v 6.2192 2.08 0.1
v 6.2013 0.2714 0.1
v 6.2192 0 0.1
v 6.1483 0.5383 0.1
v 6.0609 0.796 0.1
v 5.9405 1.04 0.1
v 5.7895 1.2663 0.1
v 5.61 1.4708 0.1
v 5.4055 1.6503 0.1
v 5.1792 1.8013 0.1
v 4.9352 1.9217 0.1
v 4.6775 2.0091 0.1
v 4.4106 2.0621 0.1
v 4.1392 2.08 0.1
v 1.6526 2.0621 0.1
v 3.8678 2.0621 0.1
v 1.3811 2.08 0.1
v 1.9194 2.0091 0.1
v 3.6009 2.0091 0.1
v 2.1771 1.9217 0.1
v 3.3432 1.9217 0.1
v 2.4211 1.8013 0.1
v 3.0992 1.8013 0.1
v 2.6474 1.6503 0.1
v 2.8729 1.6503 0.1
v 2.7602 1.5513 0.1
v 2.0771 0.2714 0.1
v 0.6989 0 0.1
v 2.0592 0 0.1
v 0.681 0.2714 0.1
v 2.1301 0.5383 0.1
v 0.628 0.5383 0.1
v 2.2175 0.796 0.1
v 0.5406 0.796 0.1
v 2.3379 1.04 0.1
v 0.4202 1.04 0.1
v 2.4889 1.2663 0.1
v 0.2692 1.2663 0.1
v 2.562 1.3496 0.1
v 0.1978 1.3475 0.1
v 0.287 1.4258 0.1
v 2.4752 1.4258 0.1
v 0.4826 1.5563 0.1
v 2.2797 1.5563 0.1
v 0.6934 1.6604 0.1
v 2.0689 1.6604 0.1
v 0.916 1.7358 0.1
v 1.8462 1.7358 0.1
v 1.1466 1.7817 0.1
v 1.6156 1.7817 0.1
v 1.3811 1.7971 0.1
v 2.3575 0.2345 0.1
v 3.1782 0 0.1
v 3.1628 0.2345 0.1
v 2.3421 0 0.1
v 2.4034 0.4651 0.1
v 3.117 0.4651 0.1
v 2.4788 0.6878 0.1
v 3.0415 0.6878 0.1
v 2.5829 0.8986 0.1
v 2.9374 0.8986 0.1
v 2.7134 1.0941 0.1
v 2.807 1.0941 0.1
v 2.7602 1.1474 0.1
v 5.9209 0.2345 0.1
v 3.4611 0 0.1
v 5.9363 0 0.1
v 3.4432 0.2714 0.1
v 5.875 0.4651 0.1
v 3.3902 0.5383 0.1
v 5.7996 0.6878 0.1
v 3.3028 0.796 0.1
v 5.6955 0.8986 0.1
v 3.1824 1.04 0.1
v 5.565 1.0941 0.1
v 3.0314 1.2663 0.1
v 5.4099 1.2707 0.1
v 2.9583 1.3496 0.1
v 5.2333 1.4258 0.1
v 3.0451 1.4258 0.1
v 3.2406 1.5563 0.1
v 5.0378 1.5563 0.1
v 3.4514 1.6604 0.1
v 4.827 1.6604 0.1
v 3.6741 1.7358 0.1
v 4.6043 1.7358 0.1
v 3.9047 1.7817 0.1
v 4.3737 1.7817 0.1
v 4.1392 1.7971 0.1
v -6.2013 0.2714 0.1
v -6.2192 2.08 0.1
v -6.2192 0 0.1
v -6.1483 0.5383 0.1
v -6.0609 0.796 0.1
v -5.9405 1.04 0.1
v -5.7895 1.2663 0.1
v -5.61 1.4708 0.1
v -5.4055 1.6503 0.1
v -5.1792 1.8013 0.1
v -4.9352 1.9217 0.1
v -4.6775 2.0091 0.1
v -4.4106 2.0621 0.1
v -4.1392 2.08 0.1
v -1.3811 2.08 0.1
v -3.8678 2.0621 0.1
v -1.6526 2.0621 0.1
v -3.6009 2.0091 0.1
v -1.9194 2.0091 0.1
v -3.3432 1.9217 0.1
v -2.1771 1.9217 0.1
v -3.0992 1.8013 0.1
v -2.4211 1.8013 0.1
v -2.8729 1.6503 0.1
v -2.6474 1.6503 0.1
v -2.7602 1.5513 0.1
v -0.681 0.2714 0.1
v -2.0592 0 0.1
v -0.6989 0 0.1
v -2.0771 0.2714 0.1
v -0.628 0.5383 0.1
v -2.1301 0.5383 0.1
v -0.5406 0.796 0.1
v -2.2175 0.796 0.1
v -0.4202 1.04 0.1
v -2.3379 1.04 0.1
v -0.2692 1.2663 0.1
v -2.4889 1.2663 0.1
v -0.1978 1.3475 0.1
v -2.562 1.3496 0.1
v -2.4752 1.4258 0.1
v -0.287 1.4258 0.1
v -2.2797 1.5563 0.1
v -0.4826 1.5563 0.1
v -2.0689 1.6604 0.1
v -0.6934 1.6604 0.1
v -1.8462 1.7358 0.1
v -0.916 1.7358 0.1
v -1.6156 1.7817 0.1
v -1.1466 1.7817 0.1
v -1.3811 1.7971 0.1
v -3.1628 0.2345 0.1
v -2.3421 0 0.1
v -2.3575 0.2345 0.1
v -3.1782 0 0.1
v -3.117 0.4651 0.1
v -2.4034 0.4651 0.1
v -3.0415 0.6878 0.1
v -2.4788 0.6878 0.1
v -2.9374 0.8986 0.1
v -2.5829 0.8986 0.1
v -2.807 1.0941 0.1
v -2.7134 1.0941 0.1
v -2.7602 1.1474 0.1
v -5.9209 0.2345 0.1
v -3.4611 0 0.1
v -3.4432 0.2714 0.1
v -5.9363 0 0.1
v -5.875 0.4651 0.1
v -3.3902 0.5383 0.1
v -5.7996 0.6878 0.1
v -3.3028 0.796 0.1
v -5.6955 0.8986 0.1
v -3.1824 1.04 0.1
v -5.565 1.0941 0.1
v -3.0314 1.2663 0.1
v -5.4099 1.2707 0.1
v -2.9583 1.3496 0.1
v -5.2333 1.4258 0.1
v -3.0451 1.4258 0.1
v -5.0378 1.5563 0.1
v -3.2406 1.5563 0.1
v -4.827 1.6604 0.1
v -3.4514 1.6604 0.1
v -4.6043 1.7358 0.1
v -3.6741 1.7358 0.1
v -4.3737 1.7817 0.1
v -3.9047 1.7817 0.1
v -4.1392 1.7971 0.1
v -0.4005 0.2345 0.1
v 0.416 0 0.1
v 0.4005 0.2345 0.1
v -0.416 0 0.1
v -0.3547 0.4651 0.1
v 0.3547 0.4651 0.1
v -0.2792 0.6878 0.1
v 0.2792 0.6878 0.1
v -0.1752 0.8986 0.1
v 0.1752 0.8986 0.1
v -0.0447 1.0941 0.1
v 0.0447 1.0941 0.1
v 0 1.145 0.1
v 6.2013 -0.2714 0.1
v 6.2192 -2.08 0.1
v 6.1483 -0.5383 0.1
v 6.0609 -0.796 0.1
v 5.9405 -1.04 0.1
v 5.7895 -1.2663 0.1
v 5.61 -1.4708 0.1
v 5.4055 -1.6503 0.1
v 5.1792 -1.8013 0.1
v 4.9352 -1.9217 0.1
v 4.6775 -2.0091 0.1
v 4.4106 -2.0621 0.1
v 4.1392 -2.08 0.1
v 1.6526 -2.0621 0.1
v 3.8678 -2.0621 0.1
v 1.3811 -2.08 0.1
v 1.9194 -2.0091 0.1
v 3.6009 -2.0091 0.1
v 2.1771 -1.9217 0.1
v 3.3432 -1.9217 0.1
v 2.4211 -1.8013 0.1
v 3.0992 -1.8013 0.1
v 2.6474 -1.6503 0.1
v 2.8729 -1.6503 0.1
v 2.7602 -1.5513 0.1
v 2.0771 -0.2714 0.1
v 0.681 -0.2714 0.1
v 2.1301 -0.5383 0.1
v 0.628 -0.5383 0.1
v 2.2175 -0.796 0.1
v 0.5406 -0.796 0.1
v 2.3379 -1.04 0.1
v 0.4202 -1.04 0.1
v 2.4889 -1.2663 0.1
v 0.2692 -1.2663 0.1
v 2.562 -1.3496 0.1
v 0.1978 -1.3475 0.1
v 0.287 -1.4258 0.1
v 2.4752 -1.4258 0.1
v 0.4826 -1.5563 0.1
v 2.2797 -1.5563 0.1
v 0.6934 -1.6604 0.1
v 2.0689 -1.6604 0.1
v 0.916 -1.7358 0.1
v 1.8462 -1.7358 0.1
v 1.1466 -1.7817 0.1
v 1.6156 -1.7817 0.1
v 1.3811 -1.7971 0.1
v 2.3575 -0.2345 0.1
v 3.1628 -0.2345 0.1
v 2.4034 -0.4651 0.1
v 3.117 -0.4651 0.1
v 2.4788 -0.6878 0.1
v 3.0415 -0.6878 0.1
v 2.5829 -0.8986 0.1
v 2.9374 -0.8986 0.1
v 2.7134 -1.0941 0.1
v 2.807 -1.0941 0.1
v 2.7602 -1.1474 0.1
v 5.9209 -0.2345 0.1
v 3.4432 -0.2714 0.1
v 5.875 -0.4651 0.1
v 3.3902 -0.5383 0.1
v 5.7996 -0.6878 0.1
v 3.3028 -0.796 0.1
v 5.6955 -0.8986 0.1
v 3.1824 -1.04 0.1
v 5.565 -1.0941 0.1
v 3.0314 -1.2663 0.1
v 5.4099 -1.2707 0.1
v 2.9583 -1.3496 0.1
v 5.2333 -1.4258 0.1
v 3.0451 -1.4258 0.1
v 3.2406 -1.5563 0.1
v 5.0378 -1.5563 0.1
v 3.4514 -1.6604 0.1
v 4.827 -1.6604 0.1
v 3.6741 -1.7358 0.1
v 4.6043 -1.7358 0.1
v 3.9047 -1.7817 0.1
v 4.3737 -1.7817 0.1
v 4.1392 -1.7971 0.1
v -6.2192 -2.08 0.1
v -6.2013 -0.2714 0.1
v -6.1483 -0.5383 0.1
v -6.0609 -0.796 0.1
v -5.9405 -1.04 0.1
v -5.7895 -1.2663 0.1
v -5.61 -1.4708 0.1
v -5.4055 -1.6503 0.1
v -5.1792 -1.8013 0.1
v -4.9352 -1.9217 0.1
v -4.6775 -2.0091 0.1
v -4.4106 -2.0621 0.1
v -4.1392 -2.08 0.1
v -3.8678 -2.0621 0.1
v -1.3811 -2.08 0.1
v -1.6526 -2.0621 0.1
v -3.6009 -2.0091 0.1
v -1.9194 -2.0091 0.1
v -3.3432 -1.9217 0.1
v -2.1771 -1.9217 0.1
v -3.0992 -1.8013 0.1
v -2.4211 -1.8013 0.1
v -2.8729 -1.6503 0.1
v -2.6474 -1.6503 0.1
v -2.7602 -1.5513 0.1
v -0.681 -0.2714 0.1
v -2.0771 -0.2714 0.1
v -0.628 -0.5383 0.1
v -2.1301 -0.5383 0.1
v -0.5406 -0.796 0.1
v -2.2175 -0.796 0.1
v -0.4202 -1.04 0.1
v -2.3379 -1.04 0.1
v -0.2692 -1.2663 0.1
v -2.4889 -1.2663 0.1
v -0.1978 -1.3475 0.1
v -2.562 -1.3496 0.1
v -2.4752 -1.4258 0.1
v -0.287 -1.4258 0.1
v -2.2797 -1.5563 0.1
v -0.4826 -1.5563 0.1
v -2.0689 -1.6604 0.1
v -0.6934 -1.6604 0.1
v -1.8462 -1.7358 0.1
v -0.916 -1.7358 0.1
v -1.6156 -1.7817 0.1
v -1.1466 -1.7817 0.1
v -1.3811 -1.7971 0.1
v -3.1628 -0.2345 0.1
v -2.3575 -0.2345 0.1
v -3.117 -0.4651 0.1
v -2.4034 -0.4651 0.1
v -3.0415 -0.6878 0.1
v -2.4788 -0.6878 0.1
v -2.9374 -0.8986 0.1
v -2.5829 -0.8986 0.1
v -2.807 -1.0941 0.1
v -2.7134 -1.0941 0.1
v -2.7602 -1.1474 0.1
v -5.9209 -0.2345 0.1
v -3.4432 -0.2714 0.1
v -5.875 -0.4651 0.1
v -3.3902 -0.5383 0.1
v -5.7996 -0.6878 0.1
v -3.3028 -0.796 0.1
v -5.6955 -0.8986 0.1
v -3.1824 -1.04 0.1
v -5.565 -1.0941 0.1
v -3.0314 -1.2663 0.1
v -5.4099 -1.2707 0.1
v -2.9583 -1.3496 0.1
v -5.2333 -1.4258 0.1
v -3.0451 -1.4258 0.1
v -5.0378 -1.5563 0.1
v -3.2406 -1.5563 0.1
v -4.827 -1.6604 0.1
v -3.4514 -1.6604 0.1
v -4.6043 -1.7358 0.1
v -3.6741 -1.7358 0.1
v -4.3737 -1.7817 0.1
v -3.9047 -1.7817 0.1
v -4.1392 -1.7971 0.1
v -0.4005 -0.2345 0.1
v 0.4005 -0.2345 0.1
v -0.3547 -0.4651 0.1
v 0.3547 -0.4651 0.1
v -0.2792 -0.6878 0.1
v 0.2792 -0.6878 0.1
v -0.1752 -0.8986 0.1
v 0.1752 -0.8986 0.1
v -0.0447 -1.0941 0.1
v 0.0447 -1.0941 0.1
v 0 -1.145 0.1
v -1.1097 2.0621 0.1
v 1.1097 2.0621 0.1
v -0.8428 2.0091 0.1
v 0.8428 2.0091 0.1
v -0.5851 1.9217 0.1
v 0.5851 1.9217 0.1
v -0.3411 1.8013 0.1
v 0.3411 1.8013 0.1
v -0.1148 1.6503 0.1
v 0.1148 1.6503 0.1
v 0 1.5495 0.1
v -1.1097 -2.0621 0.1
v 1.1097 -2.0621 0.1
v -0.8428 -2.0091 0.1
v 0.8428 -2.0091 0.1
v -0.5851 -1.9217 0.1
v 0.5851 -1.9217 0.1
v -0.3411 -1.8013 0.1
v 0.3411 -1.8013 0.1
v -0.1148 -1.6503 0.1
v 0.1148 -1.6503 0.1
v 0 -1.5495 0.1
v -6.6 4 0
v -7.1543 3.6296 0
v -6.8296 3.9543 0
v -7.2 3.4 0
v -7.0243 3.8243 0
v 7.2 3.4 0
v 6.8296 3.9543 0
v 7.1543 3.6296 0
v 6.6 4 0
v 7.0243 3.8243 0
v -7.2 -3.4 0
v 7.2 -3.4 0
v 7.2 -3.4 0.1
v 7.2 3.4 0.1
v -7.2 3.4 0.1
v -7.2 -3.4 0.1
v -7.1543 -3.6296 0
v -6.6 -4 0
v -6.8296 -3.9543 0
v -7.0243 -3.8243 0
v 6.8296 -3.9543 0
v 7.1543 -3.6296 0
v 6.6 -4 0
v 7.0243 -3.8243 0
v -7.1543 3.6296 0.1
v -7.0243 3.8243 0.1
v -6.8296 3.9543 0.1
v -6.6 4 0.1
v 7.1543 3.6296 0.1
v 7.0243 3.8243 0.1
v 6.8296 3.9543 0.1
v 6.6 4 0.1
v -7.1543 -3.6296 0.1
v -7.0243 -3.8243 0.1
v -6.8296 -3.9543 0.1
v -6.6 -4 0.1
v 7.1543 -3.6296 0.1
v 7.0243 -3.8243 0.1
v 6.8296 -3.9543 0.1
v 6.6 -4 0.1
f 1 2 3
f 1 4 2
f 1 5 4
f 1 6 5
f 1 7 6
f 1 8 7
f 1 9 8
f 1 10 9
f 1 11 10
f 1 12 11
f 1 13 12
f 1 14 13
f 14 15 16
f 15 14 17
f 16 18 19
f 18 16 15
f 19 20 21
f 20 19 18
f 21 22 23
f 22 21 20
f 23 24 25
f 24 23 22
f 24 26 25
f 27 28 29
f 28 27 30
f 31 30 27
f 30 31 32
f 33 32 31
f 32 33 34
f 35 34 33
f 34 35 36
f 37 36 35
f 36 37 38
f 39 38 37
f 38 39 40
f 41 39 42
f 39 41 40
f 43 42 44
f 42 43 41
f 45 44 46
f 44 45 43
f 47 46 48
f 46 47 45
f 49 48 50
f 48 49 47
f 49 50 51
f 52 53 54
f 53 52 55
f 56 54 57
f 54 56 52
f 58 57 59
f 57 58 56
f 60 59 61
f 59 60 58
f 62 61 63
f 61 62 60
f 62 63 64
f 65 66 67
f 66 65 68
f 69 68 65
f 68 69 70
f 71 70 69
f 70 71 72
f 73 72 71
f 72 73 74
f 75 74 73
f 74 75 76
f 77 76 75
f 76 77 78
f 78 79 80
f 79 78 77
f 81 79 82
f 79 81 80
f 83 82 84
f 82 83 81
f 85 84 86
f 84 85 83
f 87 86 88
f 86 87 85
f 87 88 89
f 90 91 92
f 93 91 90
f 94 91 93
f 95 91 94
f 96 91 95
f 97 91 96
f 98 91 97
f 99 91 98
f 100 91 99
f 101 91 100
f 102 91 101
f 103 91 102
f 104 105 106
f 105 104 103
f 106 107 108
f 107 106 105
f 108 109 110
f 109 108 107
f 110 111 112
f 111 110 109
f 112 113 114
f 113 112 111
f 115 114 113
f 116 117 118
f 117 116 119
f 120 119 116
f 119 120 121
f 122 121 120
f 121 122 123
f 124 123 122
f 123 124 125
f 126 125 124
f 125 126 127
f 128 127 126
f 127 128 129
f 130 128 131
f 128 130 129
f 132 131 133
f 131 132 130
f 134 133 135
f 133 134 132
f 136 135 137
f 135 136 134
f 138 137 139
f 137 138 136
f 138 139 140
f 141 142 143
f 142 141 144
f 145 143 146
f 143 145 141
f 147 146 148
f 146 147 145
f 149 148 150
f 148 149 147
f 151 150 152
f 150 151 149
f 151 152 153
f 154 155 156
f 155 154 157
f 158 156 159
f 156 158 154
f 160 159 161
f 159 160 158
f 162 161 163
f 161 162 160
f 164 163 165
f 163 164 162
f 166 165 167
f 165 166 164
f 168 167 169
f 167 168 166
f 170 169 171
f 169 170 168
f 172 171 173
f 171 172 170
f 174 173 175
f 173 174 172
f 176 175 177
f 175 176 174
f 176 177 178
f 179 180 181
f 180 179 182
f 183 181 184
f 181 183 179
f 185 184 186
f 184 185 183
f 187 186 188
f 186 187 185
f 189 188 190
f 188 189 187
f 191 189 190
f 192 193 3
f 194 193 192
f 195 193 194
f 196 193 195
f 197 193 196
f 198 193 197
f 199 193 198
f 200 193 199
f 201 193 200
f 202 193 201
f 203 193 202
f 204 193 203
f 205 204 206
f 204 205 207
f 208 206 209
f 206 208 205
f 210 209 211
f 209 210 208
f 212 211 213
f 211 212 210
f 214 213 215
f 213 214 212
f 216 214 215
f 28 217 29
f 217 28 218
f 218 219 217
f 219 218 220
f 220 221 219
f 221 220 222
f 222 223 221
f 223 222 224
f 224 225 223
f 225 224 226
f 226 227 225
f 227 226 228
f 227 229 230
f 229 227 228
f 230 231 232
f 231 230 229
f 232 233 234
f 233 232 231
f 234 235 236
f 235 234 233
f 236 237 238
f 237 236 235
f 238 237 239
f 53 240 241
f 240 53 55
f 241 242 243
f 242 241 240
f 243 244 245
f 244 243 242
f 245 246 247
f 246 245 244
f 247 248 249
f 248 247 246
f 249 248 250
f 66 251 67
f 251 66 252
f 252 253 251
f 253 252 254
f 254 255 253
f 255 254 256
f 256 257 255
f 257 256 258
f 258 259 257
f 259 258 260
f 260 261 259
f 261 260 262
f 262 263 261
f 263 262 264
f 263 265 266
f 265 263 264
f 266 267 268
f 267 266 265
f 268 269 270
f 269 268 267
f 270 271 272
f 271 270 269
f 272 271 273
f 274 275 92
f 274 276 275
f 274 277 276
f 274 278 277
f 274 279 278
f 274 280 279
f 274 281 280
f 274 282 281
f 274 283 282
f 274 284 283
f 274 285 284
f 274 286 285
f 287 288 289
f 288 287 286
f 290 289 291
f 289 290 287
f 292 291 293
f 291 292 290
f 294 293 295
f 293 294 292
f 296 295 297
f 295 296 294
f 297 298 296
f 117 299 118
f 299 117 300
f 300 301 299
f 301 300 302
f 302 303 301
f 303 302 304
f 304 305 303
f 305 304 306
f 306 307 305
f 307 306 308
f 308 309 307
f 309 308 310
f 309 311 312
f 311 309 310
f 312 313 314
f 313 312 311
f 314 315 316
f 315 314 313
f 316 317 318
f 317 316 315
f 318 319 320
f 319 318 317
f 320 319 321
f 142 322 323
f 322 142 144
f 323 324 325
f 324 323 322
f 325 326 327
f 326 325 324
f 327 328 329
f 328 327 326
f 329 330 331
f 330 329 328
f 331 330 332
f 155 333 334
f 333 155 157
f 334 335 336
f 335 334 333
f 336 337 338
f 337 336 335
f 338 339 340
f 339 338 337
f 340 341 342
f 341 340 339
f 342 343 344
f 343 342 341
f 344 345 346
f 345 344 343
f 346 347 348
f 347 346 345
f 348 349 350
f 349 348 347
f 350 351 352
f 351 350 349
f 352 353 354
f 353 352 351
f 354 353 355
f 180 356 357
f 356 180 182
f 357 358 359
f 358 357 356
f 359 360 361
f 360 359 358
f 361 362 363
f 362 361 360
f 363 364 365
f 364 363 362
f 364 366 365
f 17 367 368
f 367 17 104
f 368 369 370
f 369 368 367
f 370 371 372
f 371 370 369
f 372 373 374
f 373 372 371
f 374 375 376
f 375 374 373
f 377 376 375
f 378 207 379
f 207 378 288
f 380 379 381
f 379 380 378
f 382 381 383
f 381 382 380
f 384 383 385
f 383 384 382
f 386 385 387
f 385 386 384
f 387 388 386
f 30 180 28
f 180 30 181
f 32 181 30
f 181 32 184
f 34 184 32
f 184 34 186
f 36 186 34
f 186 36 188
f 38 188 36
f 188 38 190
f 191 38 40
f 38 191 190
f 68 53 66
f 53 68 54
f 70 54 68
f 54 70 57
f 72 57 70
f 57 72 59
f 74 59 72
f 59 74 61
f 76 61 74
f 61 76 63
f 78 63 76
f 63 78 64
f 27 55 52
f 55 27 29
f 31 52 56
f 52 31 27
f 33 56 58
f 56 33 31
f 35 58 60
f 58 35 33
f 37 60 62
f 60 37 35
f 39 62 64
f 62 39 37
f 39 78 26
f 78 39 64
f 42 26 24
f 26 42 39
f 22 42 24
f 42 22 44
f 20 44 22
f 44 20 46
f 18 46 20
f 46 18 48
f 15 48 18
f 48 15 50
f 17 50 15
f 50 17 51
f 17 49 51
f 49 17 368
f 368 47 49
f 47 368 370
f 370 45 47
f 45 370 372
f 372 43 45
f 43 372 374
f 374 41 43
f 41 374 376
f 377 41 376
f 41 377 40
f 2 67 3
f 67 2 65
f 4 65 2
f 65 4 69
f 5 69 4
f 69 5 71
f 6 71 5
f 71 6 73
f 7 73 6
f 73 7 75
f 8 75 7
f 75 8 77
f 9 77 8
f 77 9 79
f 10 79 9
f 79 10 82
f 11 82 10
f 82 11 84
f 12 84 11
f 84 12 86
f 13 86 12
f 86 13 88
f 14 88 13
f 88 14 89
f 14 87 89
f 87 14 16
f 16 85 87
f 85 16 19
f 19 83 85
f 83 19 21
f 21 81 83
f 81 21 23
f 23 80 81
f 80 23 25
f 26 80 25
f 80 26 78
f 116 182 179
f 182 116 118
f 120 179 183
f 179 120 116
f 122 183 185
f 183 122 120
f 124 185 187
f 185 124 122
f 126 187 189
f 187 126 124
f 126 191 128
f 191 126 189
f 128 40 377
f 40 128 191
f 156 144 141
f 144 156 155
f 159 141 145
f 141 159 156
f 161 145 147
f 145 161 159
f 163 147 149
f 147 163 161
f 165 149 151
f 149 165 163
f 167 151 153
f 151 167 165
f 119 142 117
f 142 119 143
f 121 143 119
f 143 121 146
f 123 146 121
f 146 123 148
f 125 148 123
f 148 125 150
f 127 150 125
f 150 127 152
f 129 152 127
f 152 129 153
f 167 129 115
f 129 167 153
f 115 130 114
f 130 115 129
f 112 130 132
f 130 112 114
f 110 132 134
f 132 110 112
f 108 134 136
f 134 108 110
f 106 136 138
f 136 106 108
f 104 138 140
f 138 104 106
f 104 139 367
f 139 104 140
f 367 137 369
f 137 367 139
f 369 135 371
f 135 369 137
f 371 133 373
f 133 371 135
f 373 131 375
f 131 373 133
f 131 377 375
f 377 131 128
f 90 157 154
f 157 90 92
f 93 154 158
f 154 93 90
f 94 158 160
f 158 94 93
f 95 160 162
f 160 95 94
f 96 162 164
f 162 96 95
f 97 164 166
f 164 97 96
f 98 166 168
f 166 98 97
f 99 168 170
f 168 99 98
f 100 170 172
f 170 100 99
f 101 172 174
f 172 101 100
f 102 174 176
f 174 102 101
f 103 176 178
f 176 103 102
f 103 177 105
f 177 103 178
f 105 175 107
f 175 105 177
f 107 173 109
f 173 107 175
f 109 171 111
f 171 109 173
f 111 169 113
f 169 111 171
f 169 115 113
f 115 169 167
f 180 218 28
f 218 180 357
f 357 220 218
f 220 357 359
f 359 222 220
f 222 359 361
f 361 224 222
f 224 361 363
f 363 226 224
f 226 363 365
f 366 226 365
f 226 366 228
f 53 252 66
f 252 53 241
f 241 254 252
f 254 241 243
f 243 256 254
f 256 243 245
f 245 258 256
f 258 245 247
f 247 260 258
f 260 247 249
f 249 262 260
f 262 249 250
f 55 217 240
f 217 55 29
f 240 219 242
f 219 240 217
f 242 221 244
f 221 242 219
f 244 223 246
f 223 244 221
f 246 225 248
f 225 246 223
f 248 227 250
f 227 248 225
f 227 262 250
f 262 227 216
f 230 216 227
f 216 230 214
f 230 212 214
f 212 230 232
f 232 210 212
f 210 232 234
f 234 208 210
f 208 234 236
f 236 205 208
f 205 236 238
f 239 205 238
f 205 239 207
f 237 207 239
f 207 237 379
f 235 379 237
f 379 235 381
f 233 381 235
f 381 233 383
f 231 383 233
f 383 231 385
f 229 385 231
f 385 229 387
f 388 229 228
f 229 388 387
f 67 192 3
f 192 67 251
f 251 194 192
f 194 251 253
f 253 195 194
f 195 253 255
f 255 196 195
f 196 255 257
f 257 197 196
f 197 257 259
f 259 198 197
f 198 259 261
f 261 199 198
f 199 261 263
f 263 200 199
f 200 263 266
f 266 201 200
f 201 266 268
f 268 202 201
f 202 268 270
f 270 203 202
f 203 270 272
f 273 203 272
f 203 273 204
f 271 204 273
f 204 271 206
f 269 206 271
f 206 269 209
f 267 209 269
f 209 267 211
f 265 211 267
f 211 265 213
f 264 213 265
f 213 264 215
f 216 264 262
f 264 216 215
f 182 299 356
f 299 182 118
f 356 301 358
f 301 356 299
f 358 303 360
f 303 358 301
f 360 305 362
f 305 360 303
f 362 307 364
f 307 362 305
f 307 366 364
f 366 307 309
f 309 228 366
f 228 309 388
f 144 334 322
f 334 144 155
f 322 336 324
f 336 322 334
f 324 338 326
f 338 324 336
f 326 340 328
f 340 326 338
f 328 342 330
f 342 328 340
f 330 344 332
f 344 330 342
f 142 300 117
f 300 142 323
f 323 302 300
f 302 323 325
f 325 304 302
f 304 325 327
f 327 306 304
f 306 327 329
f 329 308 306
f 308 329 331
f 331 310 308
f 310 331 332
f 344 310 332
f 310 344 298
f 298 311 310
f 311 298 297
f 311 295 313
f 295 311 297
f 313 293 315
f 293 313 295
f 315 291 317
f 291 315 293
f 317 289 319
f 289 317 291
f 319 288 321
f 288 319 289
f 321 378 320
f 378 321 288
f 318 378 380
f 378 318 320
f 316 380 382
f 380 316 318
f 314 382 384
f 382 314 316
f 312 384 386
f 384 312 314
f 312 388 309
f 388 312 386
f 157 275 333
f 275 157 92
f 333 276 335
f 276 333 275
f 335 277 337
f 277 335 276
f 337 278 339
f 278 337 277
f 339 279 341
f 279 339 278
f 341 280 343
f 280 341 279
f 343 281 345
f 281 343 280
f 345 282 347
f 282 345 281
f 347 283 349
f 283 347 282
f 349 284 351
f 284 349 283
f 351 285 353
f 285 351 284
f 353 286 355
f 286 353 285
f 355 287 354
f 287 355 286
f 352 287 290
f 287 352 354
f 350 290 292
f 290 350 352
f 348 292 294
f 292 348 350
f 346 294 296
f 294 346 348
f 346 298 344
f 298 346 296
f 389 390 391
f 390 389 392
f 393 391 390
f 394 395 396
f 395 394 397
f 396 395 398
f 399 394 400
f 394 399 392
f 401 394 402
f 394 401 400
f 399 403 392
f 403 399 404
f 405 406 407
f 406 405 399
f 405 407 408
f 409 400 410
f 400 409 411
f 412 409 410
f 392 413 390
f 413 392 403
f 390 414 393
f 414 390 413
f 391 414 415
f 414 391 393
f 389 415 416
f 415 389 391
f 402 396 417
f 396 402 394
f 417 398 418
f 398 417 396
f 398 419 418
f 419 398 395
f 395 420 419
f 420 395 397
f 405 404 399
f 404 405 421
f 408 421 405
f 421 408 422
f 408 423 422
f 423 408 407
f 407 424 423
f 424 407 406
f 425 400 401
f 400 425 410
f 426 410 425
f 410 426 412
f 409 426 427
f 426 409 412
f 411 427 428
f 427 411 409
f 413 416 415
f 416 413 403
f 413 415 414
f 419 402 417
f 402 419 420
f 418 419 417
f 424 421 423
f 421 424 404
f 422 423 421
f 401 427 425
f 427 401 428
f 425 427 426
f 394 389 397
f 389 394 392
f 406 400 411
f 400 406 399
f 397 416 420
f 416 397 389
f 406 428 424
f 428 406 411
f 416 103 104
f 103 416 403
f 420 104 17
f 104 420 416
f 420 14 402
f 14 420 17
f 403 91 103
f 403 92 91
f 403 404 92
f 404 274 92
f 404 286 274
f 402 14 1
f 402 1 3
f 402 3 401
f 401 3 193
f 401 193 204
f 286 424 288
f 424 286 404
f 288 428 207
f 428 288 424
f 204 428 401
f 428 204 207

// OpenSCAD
use <../lib.scad>
use <../p/1-4chrd.scad>
use <../p/1-4cyli.scad>
use <../p/box3u12.scad>
use <../p/logo-audi-ring-outerbox.scad>
use <../p/logo-audi-ring.scad>
function ldraw_lib__6142271g() = [
// 0 Sticker  1.8 x  1 with White Audi Logo on Red Background
// 0 Name: 6142271g.dat
// 0 Author: Massimo Maso [Sirio]
// 0 !LDRAW_ORG Part UPDATE 2025-02
// 0 !LICENSE Licensed under CC BY 4.0 : see CAreadme.txt
// 
// 0 BFC CERTIFY CCW
  [0,"BFC","CERTIFY"],
  [0,"BFC","CCW"],
// 
// 0 !KEYWORDS Bricklink 75873stk01a, Brickowl 427960, LMS, R8, Rebrickable 24755
// 0 !KEYWORDS Set 75873, Speed Champions, Ultra
// 
// 0 !HISTORY 2025-02-27 [OrionP] Official Update 2025-02
// 
// 0 // Logo primitives
// 1 4 0 -.25 0 .52 0 0 0 1 0 0 0 .52 logo-audi-ring-outerbox.dat
  [1,4,0,-.25,0,.52,0,0,0,1,0,0,0,.52, ldraw_lib__logo_audi_ring_outerbox()],
// 1 15 0 -.25 0 .52 0 0 0 1 0 0 0 .52 logo-audi-ring.dat
  [1,15,0,-.25,0,.52,0,0,0,1,0,0,0,.52, ldraw_lib__logo_audi_ring()],
// 0 // Primitives
// 1 16 -16.5 0 8.5 -1.5 0 0 0 -1 0 0 0 1.5 1-4chrd.dat
  [1,16,-16.5,0,8.5,-1.5,0,0,0,-1,0,0,0,1.5, ldraw_lib__1_4chrd()],
// 1 16 16.5 0 8.5 1.5 0 0 0 -1 0 0 0 1.5 1-4chrd.dat
  [1,16,16.5,0,8.5,1.5,0,0,0,-1,0,0,0,1.5, ldraw_lib__1_4chrd()],
// 1 16 0 -.25 0 0 0 18 0 .25 0 8.5 0 0 box3u12.dat
  [1,16,0,-.25,0,0,0,18,0,.25,0,8.5,0,0, ldraw_lib__box3u12()],
// 1 16 -16.5 0 -8.5 -1.5 0 0 0 -1 0 0 0 -1.5 1-4chrd.dat
  [1,16,-16.5,0,-8.5,-1.5,0,0,0,-1,0,0,0,-1.5, ldraw_lib__1_4chrd()],
// 1 16 16.5 0 -8.5 1.5 0 0 0 -1 0 0 0 -1.5 1-4chrd.dat
  [1,16,16.5,0,-8.5,1.5,0,0,0,-1,0,0,0,-1.5, ldraw_lib__1_4chrd()],
// 1 16 -16.5 0 8.5 -1.5 0 0 0 -.25 0 0 0 1.5 1-4cyli.dat
  [1,16,-16.5,0,8.5,-1.5,0,0,0,-.25,0,0,0,1.5, ldraw_lib__1_4cyli()],
// 1 16 16.5 0 8.5 1.5 0 0 0 -.25 0 0 0 1.5 1-4cyli.dat
  [1,16,16.5,0,8.5,1.5,0,0,0,-.25,0,0,0,1.5, ldraw_lib__1_4cyli()],
// 1 16 -16.5 0 -8.5 -1.5 0 0 0 -.25 0 0 0 -1.5 1-4cyli.dat
  [1,16,-16.5,0,-8.5,-1.5,0,0,0,-.25,0,0,0,-1.5, ldraw_lib__1_4cyli()],
// 1 16 16.5 0 -8.5 1.5 0 0 0 -.25 0 0 0 -1.5 1-4cyli.dat
  [1,16,16.5,0,-8.5,1.5,0,0,0,-.25,0,0,0,-1.5, ldraw_lib__1_4cyli()],
// 1 4 -16.5 -.25 8.5 -1.5 0 0 0 1 0 0 0 1.5 1-4chrd.dat
  [1,4,-16.5,-.25,8.5,-1.5,0,0,0,1,0,0,0,1.5, ldraw_lib__1_4chrd()],
// 1 4 16.5 -.25 8.5 1.5 0 0 0 1 0 0 0 1.5 1-4chrd.dat
  [1,4,16.5,-.25,8.5,1.5,0,0,0,1,0,0,0,1.5, ldraw_lib__1_4chrd()],
// 1 4 -16.5 -.25 -8.5 -1.5 0 0 0 1 0 0 0 -1.5 1-4chrd.dat
  [1,4,-16.5,-.25,-8.5,-1.5,0,0,0,1,0,0,0,-1.5, ldraw_lib__1_4chrd()],
// 1 4 16.5 -.25 -8.5 1.5 0 0 0 1 0 0 0 -1.5 1-4chrd.dat
  [1,4,16.5,-.25,-8.5,1.5,0,0,0,1,0,0,0,-1.5, ldraw_lib__1_4chrd()],
// 0 // Bottom faces
// 4 16 16.5 0 10 18 0 8.5 -18 0 8.5 -16.5 0 10
  [4,16,16.5,0,10,18,0,8.5,-18,0,8.5,-16.5,0,10],
// 4 16 16.5 0 -10 -16.5 0 -10 -18 0 -8.5 18 0 -8.5
  [4,16,16.5,0,-10,-16.5,0,-10,-18,0,-8.5,18,0,-8.5],
// 0 // Lateral faces
// 4 16 -16.5 0 10 -16.5 -.25 10 16.5 -.25 10 16.5 0 10
  [4,16,-16.5,0,10,-16.5,-.25,10,16.5,-.25,10,16.5,0,10],
// 4 16 -16.5 0 -10 16.5 0 -10 16.5 -.25 -10 -16.5 -.25 -10
  [4,16,-16.5,0,-10,16.5,0,-10,16.5,-.25,-10,-16.5,-.25,-10],
// 0 // Top faces
// 4 4 -16.5 -.25 10 -18 -.25 8.5 -10.348 -.25 5.2 -3.4528 -.25 5.2
  [4,4,-16.5,-.25,10,-18,-.25,8.5,-10.348,-.25,5.2,-3.4528,-.25,5.2],
// 4 4 -16.5 -.25 10 -3.4528 -.25 5.2 3.4528 -.25 5.2 16.5 -.25 10
  [4,4,-16.5,-.25,10,-3.4528,-.25,5.2,3.4528,-.25,5.2,16.5,-.25,10],
// 4 4 16.5 -.25 10 3.4528 -.25 5.2 10.348 -.25 5.2 18 -.25 8.5
  [4,4,16.5,-.25,10,3.4528,-.25,5.2,10.348,-.25,5.2,18,-.25,8.5],
// 3 4 -18 -.25 8.5 -15.548 -.25 5.2 -10.348 -.25 5.2
  [3,4,-18,-.25,8.5,-15.548,-.25,5.2,-10.348,-.25,5.2],
// 3 4 -18 -.25 8.5 -15.548 -.25 0 -15.548 -.25 5.2
  [3,4,-18,-.25,8.5,-15.548,-.25,0,-15.548,-.25,5.2],
// 3 4 -18 -.25 8.5 -18 -.25 -8.5 -15.548 -.25 0
  [3,4,-18,-.25,8.5,-18,-.25,-8.5,-15.548,-.25,0],
// 3 4 -18 -.25 -8.5 -15.548 -.25 -5.2 -15.548 -.25 0
  [3,4,-18,-.25,-8.5,-15.548,-.25,-5.2,-15.548,-.25,0],
// 3 4 -18 -.25 -8.5 -10.348 -.25 -5.2 -15.548 -.25 -5.2
  [3,4,-18,-.25,-8.5,-10.348,-.25,-5.2,-15.548,-.25,-5.2],
// 3 4 18 -.25 8.5 10.348 -.25 5.2 15.548 -.25 5.2
  [3,4,18,-.25,8.5,10.348,-.25,5.2,15.548,-.25,5.2],
// 3 4 18 -.25 8.5 15.548 -.25 5.2 15.548 -.25 0
  [3,4,18,-.25,8.5,15.548,-.25,5.2,15.548,-.25,0],
// 3 4 18 -.25 8.5 15.548 -.25 0 18 -.25 -8.5
  [3,4,18,-.25,8.5,15.548,-.25,0,18,-.25,-8.5],
// 3 4 18 -.25 -8.5 15.548 -.25 0 15.548 -.25 -5.2
  [3,4,18,-.25,-8.5,15.548,-.25,0,15.548,-.25,-5.2],
// 3 4 18 -.25 -8.5 15.548 -.25 -5.2 10.348 -.25 -5.2
  [3,4,18,-.25,-8.5,15.548,-.25,-5.2,10.348,-.25,-5.2],
// 4 4 -16.5 -.25 -10 -3.4528 -.25 -5.2 -10.348 -.25 -5.2 -18 -.25 -8.5
  [4,4,-16.5,-.25,-10,-3.4528,-.25,-5.2,-10.348,-.25,-5.2,-18,-.25,-8.5],
// 4 4 -16.5 -.25 -10 16.5 -.25 -10 3.4528 -.25 -5.2 -3.4528 -.25 -5.2
  [4,4,-16.5,-.25,-10,16.5,-.25,-10,3.4528,-.25,-5.2,-3.4528,-.25,-5.2],
// 4 4 16.5 -.25 -10 18 -.25 -8.5 10.348 -.25 -5.2 3.4528 -.25 -5.2
  [4,4,16.5,-.25,-10,18,-.25,-8.5,10.348,-.25,-5.2,3.4528,-.25,-5.2],
];
module ldraw_lib__6142271g(step=0, col=false, unit=2/5, alt=false, line=0.2, solid=!$preview)
    makepoly(ldraw_lib__6142271g(), step=step, col=col, unit=unit, alt=alt, line=line, solid=solid);
ldraw_lib__6142271g(line=0.2);
